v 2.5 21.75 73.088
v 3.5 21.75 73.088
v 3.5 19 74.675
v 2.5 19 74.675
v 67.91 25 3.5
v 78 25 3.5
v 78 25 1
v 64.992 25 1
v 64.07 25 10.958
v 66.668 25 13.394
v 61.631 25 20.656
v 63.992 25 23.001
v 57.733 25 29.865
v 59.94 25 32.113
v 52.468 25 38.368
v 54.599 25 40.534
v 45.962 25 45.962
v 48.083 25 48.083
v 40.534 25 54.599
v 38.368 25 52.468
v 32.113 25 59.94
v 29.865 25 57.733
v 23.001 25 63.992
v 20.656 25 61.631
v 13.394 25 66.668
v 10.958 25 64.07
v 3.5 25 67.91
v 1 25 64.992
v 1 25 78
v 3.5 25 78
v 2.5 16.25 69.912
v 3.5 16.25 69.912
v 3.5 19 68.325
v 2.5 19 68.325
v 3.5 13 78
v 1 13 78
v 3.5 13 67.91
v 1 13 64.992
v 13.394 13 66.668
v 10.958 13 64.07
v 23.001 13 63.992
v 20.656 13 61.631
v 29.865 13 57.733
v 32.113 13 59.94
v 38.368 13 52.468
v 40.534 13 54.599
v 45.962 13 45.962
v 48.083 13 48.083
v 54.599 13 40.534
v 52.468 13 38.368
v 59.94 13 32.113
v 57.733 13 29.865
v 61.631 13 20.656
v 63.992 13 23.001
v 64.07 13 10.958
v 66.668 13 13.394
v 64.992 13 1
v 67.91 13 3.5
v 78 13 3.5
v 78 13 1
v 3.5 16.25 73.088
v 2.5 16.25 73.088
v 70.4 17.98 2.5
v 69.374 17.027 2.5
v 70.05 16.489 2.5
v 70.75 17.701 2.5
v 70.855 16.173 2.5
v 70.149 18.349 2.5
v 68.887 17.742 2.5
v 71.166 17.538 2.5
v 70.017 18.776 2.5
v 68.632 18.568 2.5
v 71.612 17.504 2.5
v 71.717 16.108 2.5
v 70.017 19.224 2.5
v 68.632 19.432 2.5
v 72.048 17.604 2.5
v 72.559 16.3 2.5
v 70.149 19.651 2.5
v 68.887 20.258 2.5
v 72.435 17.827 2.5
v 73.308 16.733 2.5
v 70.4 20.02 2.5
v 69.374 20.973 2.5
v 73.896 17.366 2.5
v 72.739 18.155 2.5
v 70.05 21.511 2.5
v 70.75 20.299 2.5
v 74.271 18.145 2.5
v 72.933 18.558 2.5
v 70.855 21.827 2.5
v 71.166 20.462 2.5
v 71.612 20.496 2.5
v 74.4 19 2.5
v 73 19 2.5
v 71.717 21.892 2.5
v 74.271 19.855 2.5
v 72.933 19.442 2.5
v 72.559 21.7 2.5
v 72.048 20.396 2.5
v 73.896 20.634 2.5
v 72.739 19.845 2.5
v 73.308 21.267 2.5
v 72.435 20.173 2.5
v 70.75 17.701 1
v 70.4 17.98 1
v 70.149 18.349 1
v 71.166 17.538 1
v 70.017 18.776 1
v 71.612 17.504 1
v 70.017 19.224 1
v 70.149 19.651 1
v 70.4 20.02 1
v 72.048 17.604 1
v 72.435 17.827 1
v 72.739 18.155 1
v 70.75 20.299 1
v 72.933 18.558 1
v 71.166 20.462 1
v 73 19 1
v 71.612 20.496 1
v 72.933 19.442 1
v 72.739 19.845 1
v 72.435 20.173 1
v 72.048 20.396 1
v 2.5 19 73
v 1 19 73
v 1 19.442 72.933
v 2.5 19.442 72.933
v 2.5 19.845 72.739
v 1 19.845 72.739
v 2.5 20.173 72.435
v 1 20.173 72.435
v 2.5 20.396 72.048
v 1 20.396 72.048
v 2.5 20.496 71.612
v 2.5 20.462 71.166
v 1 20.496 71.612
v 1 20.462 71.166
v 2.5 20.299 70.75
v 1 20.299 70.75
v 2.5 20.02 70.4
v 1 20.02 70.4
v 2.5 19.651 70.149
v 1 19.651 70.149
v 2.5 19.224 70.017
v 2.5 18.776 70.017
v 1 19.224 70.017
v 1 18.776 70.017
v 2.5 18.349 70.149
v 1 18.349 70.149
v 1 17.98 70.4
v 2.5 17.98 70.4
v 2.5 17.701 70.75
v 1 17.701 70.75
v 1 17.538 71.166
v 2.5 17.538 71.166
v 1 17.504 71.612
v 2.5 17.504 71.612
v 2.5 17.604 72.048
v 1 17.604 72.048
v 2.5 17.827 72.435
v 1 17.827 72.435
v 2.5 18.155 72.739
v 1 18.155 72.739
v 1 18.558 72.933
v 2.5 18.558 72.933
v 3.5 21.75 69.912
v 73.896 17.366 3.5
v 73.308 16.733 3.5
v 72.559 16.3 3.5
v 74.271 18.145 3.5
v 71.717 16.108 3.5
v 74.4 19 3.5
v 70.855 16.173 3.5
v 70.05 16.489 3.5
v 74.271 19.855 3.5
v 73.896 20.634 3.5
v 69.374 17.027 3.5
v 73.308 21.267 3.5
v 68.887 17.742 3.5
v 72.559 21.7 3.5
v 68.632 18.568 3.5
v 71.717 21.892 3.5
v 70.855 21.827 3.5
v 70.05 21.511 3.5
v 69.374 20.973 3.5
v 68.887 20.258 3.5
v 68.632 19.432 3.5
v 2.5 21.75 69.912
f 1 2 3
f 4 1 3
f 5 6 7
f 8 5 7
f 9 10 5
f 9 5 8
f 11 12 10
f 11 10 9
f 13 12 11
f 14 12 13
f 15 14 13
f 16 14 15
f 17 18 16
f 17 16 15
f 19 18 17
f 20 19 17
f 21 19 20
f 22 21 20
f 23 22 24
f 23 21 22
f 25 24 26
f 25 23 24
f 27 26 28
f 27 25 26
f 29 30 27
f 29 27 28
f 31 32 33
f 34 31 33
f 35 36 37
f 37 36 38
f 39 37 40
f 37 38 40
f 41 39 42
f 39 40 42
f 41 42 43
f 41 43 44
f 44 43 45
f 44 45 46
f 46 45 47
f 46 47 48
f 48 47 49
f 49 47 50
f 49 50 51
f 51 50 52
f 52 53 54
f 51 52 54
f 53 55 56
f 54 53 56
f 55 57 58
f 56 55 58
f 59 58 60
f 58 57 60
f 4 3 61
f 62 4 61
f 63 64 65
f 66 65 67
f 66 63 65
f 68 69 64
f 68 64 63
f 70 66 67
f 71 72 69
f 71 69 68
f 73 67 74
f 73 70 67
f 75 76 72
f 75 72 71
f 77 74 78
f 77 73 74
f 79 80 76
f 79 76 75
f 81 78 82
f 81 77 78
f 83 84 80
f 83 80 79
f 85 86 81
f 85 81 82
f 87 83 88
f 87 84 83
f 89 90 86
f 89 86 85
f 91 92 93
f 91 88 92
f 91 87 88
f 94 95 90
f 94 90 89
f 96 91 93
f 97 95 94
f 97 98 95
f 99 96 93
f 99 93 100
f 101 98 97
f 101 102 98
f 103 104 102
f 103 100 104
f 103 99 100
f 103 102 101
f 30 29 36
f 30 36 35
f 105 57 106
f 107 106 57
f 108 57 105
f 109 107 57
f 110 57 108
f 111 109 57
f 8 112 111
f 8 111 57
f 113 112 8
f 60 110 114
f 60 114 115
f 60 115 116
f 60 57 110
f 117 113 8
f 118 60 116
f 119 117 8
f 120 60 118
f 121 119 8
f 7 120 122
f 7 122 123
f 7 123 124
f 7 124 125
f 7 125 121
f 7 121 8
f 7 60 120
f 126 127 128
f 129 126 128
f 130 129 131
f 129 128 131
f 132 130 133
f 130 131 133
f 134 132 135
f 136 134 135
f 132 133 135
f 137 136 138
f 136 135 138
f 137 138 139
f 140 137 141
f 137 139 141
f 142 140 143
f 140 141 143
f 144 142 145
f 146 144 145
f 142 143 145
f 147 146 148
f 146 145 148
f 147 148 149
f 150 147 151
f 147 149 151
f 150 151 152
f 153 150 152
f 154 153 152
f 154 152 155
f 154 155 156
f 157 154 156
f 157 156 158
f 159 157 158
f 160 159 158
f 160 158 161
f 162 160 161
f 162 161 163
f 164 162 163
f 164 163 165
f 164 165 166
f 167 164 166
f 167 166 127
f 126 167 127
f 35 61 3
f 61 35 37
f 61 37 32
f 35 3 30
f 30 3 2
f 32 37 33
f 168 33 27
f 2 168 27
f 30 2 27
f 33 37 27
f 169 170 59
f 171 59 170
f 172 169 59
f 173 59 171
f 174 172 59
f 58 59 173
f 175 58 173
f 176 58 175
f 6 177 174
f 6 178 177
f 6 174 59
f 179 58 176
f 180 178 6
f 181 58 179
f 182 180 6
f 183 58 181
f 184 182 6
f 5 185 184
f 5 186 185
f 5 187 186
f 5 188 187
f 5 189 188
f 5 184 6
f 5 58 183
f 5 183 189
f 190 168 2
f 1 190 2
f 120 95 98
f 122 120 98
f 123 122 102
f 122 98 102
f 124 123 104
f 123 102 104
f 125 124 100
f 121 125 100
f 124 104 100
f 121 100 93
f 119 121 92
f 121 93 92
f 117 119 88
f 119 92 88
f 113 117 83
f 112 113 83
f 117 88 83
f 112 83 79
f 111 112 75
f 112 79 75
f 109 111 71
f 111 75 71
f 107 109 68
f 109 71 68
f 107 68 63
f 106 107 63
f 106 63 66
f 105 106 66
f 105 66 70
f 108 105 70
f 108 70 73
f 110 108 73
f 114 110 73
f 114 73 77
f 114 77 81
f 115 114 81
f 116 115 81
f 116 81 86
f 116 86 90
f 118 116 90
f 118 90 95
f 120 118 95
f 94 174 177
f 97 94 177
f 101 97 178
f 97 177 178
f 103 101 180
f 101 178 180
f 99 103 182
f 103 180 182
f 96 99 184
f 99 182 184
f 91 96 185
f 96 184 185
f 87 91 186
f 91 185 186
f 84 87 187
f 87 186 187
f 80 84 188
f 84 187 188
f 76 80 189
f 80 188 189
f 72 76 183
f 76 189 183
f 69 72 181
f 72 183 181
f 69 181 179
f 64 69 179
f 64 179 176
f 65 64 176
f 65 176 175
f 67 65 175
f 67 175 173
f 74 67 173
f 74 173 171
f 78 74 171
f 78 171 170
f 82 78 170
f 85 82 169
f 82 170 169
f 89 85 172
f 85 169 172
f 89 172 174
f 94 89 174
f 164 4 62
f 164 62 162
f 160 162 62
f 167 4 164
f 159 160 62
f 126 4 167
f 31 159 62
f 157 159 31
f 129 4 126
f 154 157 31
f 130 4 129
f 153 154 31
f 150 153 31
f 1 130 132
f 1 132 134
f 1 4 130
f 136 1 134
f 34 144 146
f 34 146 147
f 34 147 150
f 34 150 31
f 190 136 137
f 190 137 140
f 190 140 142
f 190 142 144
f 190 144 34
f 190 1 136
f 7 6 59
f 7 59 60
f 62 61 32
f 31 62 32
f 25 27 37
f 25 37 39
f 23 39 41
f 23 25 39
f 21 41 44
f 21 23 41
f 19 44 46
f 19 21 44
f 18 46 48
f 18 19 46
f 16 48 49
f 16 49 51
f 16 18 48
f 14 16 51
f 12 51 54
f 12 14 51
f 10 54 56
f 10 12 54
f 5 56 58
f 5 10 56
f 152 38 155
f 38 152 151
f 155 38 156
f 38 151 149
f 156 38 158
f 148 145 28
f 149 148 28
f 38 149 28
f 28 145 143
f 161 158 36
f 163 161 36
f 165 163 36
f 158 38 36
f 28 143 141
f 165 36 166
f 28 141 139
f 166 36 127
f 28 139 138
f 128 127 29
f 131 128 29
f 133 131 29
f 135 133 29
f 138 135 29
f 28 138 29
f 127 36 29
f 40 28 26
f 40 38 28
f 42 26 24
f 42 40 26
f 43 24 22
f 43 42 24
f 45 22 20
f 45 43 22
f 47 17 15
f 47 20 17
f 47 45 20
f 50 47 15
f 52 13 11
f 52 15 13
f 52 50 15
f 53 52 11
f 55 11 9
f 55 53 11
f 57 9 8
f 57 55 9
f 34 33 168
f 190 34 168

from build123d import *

# Parameters (mm, degrees)
SKETCH1_R                   = 68
SKETCH1_R_2                 = 65
BOSS_EXTRUDE1_DEPTH         = 25
BOSS_EXTRUDE2_START         = -0.090133
SKETCH2_W                   = 7
SKETCH2_H                   = 50
BOSS_EXTRUDE2_DEPTH         = 10.090133
SKETCH3_W                   = 2
SKETCH3_H                   = 50
CUT_EXTRUDE1_DEPTH          = 10
CIRPATTERN2_COUNT           = 4
SKETCH7_R                   = 2.9
CUT_EXTRUDE4_DEPTH          = 1
CUT_EXTRUDE5_DEPTH          = 1
SKETCH9_R                   = 1.5
CUT_EXTRUDE6_DEPTH          = 115.844460032
CIRPATTERN3_COUNT           = 4
CIRPATTERN3_COPY_1_SKETCH_R = 2.9
CIRPATTERN3_COPY_1_DEPTH    = 1
CIRPATTERN3_COPY_2_SKETCH_R = 2.9
CIRPATTERN3_COPY_2_DEPTH    = 1
CIRPATTERN3_COPY_3_SKETCH_R = 2.9
CIRPATTERN3_COPY_3_DEPTH    = 1
CIRPATTERN3_COPY_4_DEPTH    = 1
CIRPATTERN3_COPY_5_DEPTH    = 1
CIRPATTERN3_COPY_6_DEPTH    = 1
CIRPATTERN3_COPY_7_SKETCH_R = 1.5
CIRPATTERN3_COPY_7_DEPTH    = 115.844460032
CIRPATTERN3_COPY_8_SKETCH_R = 1.5
CIRPATTERN3_COPY_8_DEPTH    = 115.844460032
CIRPATTERN3_COPY_9_SKETCH_R = 1.5
CIRPATTERN3_COPY_9_DEPTH    = 115.844460032
SKETCH10_W                  = 172.322225858
SKETCH10_H                  = 181.395343574
CUT_EXTRUDE7_DEPTH          = 13
CUT_EXTRUDE7_DEPTH_BACK     = 114.106144837
SKETCH4_W                   = 204.796424039
SKETCH4_H                   = 80.613482063
CUT_EXTRUDE2_DEPTH          = 114.106144837
SKETCH5_W                   = 133.005640426
SKETCH5_H                   = 101.362408315
CUT_EXTRUDE3_DEPTH          = 114.106144837
SKETCH11_W                  = 1
SKETCH11_H                  = 12
CUT_EXTRUDE8_DEPTH          = 107.456563912
CUT_EXTRUDE8_DEPTH_BACK     = 107.456563912
SKETCH12_W                  = 1
SKETCH12_H                  = 12
CUT_EXTRUDE9_DEPTH          = 10


with BuildPart() as part:
    # Sketch1 → Boss-Extrude1 (new, symmetric)
    with BuildSketch(Plane(origin=(0, 0, 0), x_dir=(1, 0, 0), z_dir=(0, 1, 0))):
        with Locations(Location((0, 0, 0), (0, 0, 270))):
            Circle(SKETCH1_R)
        with Locations(Location((0, 0, 0), (0, 0, 270))):
            Circle(SKETCH1_R_2, mode=Mode.SUBTRACT)
    extrude(amount=BOSS_EXTRUDE1_DEPTH, both=True)

    # Sketch2 → Boss-Extrude2 (add)
    with BuildSketch(Plane(origin=(68, 0, 0), x_dir=(0, 0, -1), z_dir=(1, 0, 0)).offset(BOSS_EXTRUDE2_START)):
        Rectangle(SKETCH2_W, SKETCH2_H)
    boss_extrude2 = extrude(amount=BOSS_EXTRUDE2_DEPTH)

    # Sketch3 → Cut-Extrude1 (cut)
    with BuildSketch(Plane(origin=(78, 0, 0), x_dir=(0, 0, -1), z_dir=(1, 0, 0))):
        Rectangle(SKETCH3_W, SKETCH3_H)
    cut_extrude1 = extrude(amount=-CUT_EXTRUDE1_DEPTH, mode=Mode.SUBTRACT)

    # CirPattern2: Boss-Extrude2, Cut-Extrude1 ×4 about axis
    cirpattern2_axis = Axis((0, 0, 0), (0, 1, 0))
    add([boss_extrude2.rotate(cirpattern2_axis, i * 360 / CIRPATTERN2_COUNT) for i in range(1, CIRPATTERN2_COUNT)])
    add([cut_extrude1.rotate(cirpattern2_axis, i * 360 / CIRPATTERN2_COUNT) for i in range(1, CIRPATTERN2_COUNT)], mode=Mode.SUBTRACT)

    # Sketch7 → Cut-Extrude4 (cut)
    with BuildSketch(Plane.XY.offset(3.5)):
        with Locations((71.5, 19)):
            Circle(SKETCH7_R)
    cut_extrude4 = extrude(amount=-CUT_EXTRUDE4_DEPTH, mode=Mode.SUBTRACT)

    # Sketch8 → Cut-Extrude5 (cut)
    with BuildSketch(Plane(origin=(0, 0, -3.5), x_dir=(-1, 0, 0), z_dir=(0, 0, -1))):
        Polygon((-69.91228676, 16.25), (-68.324573519, 19), (-69.91228676, 21.75), (-73.08771324, 21.75), (-74.675426481, 19), (-73.08771324, 16.25), align=None)
    cut_extrude5 = extrude(amount=-CUT_EXTRUDE5_DEPTH, mode=Mode.SUBTRACT)

    # Sketch9 → Cut-Extrude6 (cut, through all)
    with BuildSketch(Plane.XY.offset(2.5)):
        with Locations((71.5, 19)):
            Circle(SKETCH9_R)
    cut_extrude6 = extrude(amount=-CUT_EXTRUDE6_DEPTH, mode=Mode.SUBTRACT)

    # Mirror1: Cut-Extrude4, Cut-Extrude5, Cut-Extrude6 across plane
    add(cut_extrude4.mirror(Plane.ZX), mode=Mode.SUBTRACT)
    add(cut_extrude5.mirror(Plane.ZX), mode=Mode.SUBTRACT)
    add(cut_extrude6.mirror(Plane.ZX), mode=Mode.SUBTRACT)

    # CirPattern3: Cut-Extrude4, Cut-Extrude5, Cut-Extrude6 ×4 about axis
    cirpattern3_axis = Axis((0, 0, 0), (0, 1, 0))
    add([cut_extrude4.rotate(cirpattern3_axis, i * 360 / CIRPATTERN3_COUNT) for i in range(1, CIRPATTERN3_COUNT)], mode=Mode.SUBTRACT)
    add([cut_extrude5.rotate(cirpattern3_axis, i * 360 / CIRPATTERN3_COUNT) for i in range(1, CIRPATTERN3_COUNT)], mode=Mode.SUBTRACT)
    add([cut_extrude6.rotate(cirpattern3_axis, i * 360 / CIRPATTERN3_COUNT) for i in range(1, CIRPATTERN3_COUNT)], mode=Mode.SUBTRACT)

    # CirPattern3 copy 1 sketch → CirPattern3 copy 1 (cut)
    with BuildSketch(Plane(origin=(3.5, 0, 0), x_dir=(0, 0, -1), z_dir=(1, 0, 0))):
        with Locations((71.5, -19)):
            Circle(CIRPATTERN3_COPY_1_SKETCH_R)
    extrude(amount=-CIRPATTERN3_COPY_1_DEPTH, mode=Mode.SUBTRACT)

    # CirPattern3 copy 2 sketch → CirPattern3 copy 2 (cut)
    with BuildSketch(Plane(origin=(0, 0, -3.5), x_dir=(-1, 0, 0), z_dir=(0, 0, -1))):
        with Locations((71.5, -19)):
            Circle(CIRPATTERN3_COPY_2_SKETCH_R)
    extrude(amount=-CIRPATTERN3_COPY_2_DEPTH, mode=Mode.SUBTRACT)

    # CirPattern3 copy 3 sketch → CirPattern3 copy 3 (cut)
    with BuildSketch(Plane.ZY.offset(3.5)):
        with Locations((71.5, -19)):
            Circle(CIRPATTERN3_COPY_3_SKETCH_R)
    extrude(amount=-CIRPATTERN3_COPY_3_DEPTH, mode=Mode.SUBTRACT)

    # CirPattern3 copy 4 sketch → CirPattern3 copy 4 (cut)
    with BuildSketch(Plane.ZY.offset(3.5)):
        Polygon((-69.91228676, -16.25), (-68.324573519, -19), (-69.91228676, -21.75), (-73.08771324, -21.75), (-74.675426481, -19), (-73.08771324, -16.25), align=None)
    extrude(amount=-CIRPATTERN3_COPY_4_DEPTH, mode=Mode.SUBTRACT)

    # CirPattern3 copy 5 sketch → CirPattern3 copy 5 (cut)
    with BuildSketch(Plane.XY.offset(3.5)):
        Polygon((-69.91228676, -16.25), (-68.324573519, -19), (-69.91228676, -21.75), (-73.08771324, -21.75), (-74.675426481, -19), (-73.08771324, -16.25), align=None)
    extrude(amount=-CIRPATTERN3_COPY_5_DEPTH, mode=Mode.SUBTRACT)

    # CirPattern3 copy 6 sketch → CirPattern3 copy 6 (cut)
    with BuildSketch(Plane(origin=(3.5, 0, 0), x_dir=(0, 0, -1), z_dir=(1, 0, 0))):
        Polygon((-69.91228676, -16.25), (-68.324573519, -19), (-69.91228676, -21.75), (-73.08771324, -21.75), (-74.675426481, -19), (-73.08771324, -16.25), align=None)
    extrude(amount=-CIRPATTERN3_COPY_6_DEPTH, mode=Mode.SUBTRACT)

    # CirPattern3 copy 7 sketch → CirPattern3 copy 7 (cut, through all)
    with BuildSketch(Plane(origin=(2.5, 0, 0), x_dir=(0, 0, -1), z_dir=(1, 0, 0))):
        with Locations((71.5, -19)):
            Circle(CIRPATTERN3_COPY_7_SKETCH_R)
    extrude(amount=-CIRPATTERN3_COPY_7_DEPTH, mode=Mode.SUBTRACT)

    # CirPattern3 copy 8 sketch → CirPattern3 copy 8 (cut, through all)
    with BuildSketch(Plane(origin=(0, 0, -2.5), x_dir=(-1, 0, 0), z_dir=(0, 0, -1))):
        with Locations((71.5, -19)):
            Circle(CIRPATTERN3_COPY_8_SKETCH_R)
    extrude(amount=-CIRPATTERN3_COPY_8_DEPTH, mode=Mode.SUBTRACT)

    # CirPattern3 copy 9 sketch → CirPattern3 copy 9 (cut, through all)
    with BuildSketch(Plane.ZY.offset(2.5)):
        with Locations((71.5, -19)):
            Circle(CIRPATTERN3_COPY_9_SKETCH_R)
    extrude(amount=-CIRPATTERN3_COPY_9_DEPTH, mode=Mode.SUBTRACT)

    # Sketch10 → Cut-Extrude7 (cut, two sides)
    with BuildSketch(Plane(origin=(0, 0, 0), x_dir=(1, 0, 0), z_dir=(0, 1, 0))) as cut_extrude7_sk:
        with Locations((0.161152427, 1.352018999)):
            Rectangle(SKETCH10_W, SKETCH10_H)
    extrude(amount=CUT_EXTRUDE7_DEPTH, mode=Mode.SUBTRACT)
    extrude(cut_extrude7_sk.sketch, amount=-CUT_EXTRUDE7_DEPTH_BACK, mode=Mode.SUBTRACT)

    # Sketch4 → Cut-Extrude2 (cut, through all)
    with BuildSketch(Plane.XY):
        with Locations((-0.265516435, -0.614198292)):
            Rectangle(SKETCH4_W, SKETCH4_H)
    extrude(amount=-CUT_EXTRUDE2_DEPTH, mode=Mode.SUBTRACT)

    # Sketch5 → Cut-Extrude3 (cut, through all)
    with BuildSketch(Plane(origin=(0, 0, 0), x_dir=(0, 0, -1), z_dir=(1, 0, 0))):
        with Locations((-14.085466414, 0.839605882)):
            Rectangle(SKETCH5_W, SKETCH5_H)
    extrude(amount=-CUT_EXTRUDE3_DEPTH, mode=Mode.SUBTRACT)

    # Sketch11 → Cut-Extrude8 (cut, two sides)
    with BuildSketch(Plane(origin=(68, 0, 0), x_dir=(0, 0, -1), z_dir=(1, 0, 0))) as cut_extrude8_sk:
        with Locations((-0.5, 19)):
            Rectangle(SKETCH11_W, SKETCH11_H)
    extrude(amount=CUT_EXTRUDE8_DEPTH, mode=Mode.SUBTRACT)
    extrude(cut_extrude8_sk.sketch, amount=-CUT_EXTRUDE8_DEPTH_BACK, mode=Mode.SUBTRACT)

    # Sketch12 → Cut-Extrude9 (cut)
    with BuildSketch(Plane.XY.offset(68)):
        with Locations((0.5, 19)):
            Rectangle(SKETCH12_W, SKETCH12_H)
    extrude(amount=-CUT_EXTRUDE9_DEPTH, mode=Mode.SUBTRACT)


solid = part.part
